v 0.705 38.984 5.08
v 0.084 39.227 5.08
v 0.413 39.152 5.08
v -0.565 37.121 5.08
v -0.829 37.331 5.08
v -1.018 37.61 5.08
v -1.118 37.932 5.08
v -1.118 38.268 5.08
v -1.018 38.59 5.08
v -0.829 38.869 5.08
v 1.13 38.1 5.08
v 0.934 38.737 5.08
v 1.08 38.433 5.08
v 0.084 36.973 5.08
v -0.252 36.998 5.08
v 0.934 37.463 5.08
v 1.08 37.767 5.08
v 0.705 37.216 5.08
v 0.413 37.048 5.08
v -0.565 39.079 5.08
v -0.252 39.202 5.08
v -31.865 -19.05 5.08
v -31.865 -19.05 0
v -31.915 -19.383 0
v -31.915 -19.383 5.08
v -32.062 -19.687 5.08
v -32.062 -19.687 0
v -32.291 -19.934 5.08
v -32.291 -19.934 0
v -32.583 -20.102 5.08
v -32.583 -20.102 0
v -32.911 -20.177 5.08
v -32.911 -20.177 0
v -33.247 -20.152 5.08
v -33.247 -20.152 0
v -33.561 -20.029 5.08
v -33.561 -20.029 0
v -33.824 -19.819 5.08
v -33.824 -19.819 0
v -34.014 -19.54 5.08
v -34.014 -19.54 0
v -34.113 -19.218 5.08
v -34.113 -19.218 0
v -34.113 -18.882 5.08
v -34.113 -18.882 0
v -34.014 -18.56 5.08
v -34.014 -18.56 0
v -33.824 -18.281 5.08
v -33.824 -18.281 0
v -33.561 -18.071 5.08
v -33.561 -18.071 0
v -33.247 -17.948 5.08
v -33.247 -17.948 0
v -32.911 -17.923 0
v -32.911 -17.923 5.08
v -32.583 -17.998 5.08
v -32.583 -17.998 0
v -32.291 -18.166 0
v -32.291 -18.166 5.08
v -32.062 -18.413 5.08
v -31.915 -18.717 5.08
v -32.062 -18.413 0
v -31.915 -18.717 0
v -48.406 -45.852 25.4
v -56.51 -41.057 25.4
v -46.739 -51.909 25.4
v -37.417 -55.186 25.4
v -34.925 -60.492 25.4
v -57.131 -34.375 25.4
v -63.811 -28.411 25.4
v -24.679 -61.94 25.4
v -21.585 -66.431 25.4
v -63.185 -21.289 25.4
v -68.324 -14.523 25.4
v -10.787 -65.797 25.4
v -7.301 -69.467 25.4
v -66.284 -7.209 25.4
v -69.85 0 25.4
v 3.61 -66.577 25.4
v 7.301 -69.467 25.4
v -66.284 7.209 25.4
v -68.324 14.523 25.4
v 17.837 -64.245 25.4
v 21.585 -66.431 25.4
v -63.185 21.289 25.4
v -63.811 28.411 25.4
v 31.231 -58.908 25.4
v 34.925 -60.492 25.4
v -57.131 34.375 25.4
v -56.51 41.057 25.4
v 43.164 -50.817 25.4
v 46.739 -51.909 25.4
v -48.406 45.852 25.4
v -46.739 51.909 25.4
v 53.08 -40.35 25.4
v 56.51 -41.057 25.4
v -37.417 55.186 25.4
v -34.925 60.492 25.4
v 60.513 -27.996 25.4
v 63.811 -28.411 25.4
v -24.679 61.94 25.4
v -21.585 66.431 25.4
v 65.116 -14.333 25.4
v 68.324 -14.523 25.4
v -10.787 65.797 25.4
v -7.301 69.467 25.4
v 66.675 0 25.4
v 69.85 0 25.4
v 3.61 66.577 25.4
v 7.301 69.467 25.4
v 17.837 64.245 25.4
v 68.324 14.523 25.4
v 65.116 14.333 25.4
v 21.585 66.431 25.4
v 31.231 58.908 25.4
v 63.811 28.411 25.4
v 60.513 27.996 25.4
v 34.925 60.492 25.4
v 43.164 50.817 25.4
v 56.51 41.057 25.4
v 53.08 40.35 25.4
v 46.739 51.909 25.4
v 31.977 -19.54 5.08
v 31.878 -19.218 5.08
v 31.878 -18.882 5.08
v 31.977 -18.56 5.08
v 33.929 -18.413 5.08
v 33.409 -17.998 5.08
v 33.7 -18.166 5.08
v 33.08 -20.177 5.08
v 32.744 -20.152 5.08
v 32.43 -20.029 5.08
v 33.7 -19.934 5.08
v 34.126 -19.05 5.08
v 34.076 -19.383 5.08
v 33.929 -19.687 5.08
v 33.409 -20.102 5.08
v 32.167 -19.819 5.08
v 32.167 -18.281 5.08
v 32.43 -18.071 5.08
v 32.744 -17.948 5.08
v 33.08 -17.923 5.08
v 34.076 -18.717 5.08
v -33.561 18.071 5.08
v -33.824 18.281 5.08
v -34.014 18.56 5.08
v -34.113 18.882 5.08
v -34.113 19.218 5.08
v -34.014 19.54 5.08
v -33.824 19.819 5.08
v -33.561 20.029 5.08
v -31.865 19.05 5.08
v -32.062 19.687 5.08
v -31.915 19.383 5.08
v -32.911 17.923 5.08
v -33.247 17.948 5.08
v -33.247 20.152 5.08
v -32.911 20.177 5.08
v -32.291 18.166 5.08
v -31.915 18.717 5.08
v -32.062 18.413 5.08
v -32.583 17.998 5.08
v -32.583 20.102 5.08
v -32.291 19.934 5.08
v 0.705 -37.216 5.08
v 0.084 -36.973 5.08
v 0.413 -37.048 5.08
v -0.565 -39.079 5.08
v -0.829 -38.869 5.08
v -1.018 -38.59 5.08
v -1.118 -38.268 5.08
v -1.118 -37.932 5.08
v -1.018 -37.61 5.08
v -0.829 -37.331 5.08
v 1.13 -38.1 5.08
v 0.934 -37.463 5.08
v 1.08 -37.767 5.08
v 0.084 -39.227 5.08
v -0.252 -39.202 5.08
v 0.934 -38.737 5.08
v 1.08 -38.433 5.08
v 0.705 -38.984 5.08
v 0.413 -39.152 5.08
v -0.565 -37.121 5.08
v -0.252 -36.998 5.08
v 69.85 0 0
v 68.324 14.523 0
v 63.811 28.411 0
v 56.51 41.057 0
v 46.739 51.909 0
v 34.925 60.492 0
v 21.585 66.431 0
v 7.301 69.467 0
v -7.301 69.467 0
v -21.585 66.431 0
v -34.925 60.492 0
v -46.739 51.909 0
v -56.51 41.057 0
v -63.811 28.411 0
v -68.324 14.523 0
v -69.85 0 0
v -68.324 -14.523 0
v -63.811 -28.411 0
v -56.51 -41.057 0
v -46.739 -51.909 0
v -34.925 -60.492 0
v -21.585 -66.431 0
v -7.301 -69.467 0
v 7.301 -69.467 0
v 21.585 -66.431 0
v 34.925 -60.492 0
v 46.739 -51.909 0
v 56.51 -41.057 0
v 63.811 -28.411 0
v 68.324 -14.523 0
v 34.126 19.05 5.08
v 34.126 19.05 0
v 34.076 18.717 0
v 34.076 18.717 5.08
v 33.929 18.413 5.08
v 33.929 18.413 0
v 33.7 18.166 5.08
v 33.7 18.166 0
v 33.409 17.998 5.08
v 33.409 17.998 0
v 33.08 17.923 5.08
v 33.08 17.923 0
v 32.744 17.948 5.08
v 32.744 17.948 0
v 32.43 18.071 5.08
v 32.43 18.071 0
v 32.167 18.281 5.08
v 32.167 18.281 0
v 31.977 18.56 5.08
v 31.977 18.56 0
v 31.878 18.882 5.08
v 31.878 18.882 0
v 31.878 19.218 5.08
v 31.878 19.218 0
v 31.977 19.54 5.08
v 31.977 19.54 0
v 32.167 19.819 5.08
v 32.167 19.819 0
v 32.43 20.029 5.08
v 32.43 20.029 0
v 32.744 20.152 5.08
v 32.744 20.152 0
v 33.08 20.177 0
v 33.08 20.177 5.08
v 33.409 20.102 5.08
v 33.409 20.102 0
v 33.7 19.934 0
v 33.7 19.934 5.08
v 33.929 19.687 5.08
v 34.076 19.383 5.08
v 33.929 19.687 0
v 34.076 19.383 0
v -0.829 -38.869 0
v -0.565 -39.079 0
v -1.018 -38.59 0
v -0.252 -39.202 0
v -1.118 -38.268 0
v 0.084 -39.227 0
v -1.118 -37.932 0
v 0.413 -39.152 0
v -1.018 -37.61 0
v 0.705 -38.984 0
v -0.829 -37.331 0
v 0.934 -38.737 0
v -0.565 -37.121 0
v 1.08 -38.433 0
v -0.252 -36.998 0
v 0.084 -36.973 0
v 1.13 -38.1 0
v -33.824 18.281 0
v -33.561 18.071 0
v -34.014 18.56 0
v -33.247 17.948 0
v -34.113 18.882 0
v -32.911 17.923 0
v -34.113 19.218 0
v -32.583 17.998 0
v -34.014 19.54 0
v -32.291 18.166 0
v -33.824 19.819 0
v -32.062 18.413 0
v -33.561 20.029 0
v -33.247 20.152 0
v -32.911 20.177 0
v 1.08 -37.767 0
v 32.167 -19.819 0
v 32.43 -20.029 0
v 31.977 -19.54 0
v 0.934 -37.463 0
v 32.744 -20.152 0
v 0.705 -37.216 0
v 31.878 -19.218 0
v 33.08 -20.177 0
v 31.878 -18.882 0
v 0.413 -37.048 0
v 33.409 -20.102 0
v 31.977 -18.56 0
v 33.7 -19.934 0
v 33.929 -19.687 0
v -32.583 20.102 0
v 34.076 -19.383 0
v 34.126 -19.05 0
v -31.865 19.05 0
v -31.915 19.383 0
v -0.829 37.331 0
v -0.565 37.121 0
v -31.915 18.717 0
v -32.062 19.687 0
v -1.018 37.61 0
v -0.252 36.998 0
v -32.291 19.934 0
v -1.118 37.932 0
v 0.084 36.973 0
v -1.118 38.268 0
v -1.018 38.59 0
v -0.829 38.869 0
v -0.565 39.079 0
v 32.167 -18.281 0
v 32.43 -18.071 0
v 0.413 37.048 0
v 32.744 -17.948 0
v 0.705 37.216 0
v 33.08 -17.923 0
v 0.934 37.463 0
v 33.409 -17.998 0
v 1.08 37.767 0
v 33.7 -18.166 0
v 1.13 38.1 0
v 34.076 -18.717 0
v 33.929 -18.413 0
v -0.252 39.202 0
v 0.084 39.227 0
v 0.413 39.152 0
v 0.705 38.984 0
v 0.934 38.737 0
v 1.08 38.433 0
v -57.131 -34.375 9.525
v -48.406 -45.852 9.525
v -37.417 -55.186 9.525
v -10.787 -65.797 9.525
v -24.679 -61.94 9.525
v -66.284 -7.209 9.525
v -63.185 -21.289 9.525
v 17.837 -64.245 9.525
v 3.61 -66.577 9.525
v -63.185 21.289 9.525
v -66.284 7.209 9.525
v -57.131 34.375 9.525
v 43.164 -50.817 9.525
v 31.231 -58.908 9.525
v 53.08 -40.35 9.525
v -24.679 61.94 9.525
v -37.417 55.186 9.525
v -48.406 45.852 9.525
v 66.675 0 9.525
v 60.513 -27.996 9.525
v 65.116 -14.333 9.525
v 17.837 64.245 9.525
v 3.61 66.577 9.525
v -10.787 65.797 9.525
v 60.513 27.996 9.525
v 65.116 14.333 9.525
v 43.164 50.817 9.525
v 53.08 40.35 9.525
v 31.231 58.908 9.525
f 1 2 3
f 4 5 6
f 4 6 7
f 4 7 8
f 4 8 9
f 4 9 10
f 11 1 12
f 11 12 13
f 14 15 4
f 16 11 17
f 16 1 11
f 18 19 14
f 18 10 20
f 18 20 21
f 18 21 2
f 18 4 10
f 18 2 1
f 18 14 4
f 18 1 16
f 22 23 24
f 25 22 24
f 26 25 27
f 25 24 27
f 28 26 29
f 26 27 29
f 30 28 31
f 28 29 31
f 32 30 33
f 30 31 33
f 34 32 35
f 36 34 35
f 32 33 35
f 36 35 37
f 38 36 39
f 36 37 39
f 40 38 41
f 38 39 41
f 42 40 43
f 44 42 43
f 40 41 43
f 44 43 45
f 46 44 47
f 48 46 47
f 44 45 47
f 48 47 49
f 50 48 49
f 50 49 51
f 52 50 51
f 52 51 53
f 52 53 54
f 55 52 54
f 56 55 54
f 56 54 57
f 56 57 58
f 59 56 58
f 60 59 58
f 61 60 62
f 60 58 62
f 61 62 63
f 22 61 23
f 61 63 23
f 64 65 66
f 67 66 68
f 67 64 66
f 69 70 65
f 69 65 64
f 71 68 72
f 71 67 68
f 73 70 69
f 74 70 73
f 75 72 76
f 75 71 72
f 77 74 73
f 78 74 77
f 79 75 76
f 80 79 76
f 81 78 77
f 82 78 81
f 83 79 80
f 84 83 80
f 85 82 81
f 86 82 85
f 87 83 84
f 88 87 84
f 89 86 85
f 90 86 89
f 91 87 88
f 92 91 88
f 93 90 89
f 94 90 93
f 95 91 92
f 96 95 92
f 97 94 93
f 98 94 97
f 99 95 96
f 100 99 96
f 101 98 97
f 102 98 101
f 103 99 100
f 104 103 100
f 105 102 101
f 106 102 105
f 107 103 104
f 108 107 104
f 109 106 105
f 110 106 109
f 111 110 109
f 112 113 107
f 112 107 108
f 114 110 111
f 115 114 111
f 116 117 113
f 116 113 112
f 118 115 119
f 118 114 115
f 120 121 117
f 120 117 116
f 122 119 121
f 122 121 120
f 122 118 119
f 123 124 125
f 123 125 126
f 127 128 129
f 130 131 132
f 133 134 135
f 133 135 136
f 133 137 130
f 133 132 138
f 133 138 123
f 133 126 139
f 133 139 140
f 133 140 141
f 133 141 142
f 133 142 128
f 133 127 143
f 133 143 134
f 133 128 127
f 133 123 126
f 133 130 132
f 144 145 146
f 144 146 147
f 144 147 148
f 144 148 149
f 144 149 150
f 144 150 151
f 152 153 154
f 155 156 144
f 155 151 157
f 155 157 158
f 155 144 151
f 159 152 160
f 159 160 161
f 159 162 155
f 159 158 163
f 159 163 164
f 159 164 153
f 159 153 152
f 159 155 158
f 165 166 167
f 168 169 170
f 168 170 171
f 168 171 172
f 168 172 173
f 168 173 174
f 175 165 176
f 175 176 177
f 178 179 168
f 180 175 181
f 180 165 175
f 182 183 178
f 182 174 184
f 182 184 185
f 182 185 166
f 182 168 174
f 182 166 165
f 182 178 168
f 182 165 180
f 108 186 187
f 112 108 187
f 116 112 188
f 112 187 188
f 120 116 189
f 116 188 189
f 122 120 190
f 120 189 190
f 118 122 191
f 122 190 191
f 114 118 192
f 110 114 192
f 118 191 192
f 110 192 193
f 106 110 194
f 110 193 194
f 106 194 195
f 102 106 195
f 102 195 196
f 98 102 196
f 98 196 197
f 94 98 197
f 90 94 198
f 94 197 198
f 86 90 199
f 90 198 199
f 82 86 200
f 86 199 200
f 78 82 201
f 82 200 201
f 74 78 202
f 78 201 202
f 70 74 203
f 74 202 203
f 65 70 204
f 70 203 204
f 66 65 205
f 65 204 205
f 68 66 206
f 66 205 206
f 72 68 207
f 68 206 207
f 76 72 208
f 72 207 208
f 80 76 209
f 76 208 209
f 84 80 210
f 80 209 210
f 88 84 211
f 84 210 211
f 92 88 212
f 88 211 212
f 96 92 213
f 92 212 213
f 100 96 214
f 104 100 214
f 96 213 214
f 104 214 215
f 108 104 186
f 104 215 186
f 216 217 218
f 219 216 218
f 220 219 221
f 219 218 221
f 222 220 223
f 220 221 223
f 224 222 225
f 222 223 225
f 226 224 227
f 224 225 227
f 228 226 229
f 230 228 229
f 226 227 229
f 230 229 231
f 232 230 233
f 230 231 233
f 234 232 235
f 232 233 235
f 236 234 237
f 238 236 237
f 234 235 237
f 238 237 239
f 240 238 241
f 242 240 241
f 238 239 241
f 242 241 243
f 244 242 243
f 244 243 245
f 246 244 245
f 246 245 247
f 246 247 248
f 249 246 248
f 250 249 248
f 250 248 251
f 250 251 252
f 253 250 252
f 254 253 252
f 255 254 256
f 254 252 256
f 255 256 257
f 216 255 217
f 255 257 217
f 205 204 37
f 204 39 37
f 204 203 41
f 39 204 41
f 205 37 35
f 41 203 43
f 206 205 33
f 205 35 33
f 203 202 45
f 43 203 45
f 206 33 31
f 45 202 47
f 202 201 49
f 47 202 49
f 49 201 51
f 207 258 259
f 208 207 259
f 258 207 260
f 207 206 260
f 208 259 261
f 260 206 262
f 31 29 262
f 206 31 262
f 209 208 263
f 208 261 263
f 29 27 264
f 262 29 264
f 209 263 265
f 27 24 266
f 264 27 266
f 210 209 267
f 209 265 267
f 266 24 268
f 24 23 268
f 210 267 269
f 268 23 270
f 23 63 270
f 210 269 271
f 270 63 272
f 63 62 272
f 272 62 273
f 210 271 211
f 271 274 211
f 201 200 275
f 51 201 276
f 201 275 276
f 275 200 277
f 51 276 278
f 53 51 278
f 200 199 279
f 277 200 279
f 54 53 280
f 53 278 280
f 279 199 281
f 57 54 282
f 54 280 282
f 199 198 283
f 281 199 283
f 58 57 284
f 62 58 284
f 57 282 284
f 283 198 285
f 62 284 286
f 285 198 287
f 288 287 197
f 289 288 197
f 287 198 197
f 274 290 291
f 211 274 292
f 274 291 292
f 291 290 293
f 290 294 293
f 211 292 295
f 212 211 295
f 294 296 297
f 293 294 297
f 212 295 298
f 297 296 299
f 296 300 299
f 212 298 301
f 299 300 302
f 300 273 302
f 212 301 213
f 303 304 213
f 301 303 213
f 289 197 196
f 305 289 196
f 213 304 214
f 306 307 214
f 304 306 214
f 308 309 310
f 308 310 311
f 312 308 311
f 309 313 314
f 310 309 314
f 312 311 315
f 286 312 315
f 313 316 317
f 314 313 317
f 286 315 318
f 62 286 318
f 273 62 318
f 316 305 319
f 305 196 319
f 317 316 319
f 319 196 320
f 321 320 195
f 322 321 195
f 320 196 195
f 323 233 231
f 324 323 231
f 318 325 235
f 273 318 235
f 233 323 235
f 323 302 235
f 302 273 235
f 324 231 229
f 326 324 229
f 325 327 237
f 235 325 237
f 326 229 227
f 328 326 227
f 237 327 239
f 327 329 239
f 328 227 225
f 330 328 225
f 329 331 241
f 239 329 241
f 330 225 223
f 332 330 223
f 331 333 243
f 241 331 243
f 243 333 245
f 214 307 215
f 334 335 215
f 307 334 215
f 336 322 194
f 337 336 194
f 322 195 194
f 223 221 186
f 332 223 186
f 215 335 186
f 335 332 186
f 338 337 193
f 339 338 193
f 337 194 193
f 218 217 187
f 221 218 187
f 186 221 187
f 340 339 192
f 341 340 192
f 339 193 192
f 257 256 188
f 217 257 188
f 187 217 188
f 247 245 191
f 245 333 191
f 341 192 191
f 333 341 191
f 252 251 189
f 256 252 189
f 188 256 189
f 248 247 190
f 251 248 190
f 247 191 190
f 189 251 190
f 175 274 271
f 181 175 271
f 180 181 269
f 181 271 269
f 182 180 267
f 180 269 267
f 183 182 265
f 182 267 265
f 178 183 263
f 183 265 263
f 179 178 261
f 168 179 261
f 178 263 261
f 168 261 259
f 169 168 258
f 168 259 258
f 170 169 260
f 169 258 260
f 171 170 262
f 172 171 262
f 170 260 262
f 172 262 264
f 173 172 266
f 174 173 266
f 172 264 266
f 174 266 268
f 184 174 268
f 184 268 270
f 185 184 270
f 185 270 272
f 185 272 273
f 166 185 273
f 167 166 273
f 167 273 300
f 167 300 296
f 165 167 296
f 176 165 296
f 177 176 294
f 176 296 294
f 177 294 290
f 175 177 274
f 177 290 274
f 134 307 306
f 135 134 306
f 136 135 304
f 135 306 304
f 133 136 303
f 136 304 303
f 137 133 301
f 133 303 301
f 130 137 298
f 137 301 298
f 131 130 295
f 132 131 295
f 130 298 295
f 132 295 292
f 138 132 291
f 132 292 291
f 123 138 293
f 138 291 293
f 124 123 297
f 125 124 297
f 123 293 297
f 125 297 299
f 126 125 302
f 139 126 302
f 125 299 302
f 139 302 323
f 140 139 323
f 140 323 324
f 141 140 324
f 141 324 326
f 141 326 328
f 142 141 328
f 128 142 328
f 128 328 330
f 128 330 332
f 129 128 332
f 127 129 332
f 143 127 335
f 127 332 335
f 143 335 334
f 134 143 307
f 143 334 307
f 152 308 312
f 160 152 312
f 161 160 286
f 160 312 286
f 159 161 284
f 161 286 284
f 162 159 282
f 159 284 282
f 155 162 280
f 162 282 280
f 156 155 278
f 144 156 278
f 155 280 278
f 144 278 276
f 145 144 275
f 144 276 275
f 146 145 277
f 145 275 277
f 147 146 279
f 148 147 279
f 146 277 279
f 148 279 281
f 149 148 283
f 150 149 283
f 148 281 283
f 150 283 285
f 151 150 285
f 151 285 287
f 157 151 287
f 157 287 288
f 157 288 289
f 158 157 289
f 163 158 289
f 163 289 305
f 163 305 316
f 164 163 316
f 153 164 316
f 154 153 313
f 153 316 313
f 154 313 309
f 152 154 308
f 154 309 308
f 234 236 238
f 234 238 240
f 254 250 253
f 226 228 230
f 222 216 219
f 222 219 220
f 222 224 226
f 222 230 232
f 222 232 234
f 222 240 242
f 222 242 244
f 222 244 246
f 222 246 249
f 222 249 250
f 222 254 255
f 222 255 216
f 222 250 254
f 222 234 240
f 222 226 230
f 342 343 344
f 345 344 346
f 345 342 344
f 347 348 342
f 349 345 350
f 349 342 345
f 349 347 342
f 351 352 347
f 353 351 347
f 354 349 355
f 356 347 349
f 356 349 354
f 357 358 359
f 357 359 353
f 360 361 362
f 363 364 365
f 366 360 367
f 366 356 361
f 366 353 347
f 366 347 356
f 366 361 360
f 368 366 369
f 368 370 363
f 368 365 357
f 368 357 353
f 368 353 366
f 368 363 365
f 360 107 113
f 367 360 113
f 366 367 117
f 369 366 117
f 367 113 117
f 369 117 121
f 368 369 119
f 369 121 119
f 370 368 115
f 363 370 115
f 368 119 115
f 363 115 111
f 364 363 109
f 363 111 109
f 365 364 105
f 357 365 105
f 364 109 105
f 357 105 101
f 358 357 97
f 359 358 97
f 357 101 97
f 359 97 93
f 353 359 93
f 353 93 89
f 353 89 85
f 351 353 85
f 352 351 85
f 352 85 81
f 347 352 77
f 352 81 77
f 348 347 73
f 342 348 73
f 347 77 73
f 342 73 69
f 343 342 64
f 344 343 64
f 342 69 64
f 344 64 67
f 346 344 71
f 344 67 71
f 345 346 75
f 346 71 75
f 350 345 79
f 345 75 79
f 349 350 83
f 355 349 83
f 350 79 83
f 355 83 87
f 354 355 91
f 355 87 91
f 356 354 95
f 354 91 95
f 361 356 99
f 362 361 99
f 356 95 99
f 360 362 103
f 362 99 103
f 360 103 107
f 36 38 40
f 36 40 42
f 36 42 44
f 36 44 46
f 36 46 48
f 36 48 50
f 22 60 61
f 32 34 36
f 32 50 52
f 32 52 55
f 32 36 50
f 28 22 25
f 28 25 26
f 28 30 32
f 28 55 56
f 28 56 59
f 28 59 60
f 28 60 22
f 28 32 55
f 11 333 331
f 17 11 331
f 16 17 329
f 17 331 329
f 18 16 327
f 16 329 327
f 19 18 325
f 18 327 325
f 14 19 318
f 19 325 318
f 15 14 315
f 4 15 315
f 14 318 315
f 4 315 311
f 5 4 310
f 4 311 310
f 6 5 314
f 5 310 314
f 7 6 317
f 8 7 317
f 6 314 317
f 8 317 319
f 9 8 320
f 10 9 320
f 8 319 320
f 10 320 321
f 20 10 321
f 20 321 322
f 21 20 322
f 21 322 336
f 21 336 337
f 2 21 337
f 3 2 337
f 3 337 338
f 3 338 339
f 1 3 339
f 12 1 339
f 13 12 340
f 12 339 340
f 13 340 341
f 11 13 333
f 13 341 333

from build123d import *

# Parameters (mm, degrees)
F0_R     = 69.85
F1_DEPTH = 25.4
F2_R     = 66.675
F3_DEPTH = 15.875
F4_R     = 1.1303
F5_DEPTH = 5.08


with BuildPart() as f1:
    # F0 (on Top) → F1 (new body)
    with BuildSketch(Plane.XY):
        Circle(F0_R)
    extrude(amount=F1_DEPTH)

    # F2 (on face) → F3 (cut)
    with BuildSketch(Plane.XY.offset(25.4)):
        Circle(F2_R)
    extrude(amount=-F3_DEPTH, mode=Mode.SUBTRACT)

    # F4 (on face) → F5 (cut)
    with BuildSketch(Plane(origin=(0, 0, 0), x_dir=(1, 0, 0), z_dir=(0, 0, -1))):
        with Locations((0, 38.1)):
            Circle(F4_R)
        with Locations((-32.995568, 19.05)):
            Circle(F4_R)
        with Locations((-32.995568, -19.05)):
            Circle(F4_R)
        with Locations((0, -38.1)):
            Circle(F4_R)
        with Locations((32.995568, -19.05)):
            Circle(F4_R)
        with Locations((32.995568, 19.05)):
            Circle(F4_R)
    extrude(amount=-F5_DEPTH, mode=Mode.SUBTRACT)


solid = f1.part
